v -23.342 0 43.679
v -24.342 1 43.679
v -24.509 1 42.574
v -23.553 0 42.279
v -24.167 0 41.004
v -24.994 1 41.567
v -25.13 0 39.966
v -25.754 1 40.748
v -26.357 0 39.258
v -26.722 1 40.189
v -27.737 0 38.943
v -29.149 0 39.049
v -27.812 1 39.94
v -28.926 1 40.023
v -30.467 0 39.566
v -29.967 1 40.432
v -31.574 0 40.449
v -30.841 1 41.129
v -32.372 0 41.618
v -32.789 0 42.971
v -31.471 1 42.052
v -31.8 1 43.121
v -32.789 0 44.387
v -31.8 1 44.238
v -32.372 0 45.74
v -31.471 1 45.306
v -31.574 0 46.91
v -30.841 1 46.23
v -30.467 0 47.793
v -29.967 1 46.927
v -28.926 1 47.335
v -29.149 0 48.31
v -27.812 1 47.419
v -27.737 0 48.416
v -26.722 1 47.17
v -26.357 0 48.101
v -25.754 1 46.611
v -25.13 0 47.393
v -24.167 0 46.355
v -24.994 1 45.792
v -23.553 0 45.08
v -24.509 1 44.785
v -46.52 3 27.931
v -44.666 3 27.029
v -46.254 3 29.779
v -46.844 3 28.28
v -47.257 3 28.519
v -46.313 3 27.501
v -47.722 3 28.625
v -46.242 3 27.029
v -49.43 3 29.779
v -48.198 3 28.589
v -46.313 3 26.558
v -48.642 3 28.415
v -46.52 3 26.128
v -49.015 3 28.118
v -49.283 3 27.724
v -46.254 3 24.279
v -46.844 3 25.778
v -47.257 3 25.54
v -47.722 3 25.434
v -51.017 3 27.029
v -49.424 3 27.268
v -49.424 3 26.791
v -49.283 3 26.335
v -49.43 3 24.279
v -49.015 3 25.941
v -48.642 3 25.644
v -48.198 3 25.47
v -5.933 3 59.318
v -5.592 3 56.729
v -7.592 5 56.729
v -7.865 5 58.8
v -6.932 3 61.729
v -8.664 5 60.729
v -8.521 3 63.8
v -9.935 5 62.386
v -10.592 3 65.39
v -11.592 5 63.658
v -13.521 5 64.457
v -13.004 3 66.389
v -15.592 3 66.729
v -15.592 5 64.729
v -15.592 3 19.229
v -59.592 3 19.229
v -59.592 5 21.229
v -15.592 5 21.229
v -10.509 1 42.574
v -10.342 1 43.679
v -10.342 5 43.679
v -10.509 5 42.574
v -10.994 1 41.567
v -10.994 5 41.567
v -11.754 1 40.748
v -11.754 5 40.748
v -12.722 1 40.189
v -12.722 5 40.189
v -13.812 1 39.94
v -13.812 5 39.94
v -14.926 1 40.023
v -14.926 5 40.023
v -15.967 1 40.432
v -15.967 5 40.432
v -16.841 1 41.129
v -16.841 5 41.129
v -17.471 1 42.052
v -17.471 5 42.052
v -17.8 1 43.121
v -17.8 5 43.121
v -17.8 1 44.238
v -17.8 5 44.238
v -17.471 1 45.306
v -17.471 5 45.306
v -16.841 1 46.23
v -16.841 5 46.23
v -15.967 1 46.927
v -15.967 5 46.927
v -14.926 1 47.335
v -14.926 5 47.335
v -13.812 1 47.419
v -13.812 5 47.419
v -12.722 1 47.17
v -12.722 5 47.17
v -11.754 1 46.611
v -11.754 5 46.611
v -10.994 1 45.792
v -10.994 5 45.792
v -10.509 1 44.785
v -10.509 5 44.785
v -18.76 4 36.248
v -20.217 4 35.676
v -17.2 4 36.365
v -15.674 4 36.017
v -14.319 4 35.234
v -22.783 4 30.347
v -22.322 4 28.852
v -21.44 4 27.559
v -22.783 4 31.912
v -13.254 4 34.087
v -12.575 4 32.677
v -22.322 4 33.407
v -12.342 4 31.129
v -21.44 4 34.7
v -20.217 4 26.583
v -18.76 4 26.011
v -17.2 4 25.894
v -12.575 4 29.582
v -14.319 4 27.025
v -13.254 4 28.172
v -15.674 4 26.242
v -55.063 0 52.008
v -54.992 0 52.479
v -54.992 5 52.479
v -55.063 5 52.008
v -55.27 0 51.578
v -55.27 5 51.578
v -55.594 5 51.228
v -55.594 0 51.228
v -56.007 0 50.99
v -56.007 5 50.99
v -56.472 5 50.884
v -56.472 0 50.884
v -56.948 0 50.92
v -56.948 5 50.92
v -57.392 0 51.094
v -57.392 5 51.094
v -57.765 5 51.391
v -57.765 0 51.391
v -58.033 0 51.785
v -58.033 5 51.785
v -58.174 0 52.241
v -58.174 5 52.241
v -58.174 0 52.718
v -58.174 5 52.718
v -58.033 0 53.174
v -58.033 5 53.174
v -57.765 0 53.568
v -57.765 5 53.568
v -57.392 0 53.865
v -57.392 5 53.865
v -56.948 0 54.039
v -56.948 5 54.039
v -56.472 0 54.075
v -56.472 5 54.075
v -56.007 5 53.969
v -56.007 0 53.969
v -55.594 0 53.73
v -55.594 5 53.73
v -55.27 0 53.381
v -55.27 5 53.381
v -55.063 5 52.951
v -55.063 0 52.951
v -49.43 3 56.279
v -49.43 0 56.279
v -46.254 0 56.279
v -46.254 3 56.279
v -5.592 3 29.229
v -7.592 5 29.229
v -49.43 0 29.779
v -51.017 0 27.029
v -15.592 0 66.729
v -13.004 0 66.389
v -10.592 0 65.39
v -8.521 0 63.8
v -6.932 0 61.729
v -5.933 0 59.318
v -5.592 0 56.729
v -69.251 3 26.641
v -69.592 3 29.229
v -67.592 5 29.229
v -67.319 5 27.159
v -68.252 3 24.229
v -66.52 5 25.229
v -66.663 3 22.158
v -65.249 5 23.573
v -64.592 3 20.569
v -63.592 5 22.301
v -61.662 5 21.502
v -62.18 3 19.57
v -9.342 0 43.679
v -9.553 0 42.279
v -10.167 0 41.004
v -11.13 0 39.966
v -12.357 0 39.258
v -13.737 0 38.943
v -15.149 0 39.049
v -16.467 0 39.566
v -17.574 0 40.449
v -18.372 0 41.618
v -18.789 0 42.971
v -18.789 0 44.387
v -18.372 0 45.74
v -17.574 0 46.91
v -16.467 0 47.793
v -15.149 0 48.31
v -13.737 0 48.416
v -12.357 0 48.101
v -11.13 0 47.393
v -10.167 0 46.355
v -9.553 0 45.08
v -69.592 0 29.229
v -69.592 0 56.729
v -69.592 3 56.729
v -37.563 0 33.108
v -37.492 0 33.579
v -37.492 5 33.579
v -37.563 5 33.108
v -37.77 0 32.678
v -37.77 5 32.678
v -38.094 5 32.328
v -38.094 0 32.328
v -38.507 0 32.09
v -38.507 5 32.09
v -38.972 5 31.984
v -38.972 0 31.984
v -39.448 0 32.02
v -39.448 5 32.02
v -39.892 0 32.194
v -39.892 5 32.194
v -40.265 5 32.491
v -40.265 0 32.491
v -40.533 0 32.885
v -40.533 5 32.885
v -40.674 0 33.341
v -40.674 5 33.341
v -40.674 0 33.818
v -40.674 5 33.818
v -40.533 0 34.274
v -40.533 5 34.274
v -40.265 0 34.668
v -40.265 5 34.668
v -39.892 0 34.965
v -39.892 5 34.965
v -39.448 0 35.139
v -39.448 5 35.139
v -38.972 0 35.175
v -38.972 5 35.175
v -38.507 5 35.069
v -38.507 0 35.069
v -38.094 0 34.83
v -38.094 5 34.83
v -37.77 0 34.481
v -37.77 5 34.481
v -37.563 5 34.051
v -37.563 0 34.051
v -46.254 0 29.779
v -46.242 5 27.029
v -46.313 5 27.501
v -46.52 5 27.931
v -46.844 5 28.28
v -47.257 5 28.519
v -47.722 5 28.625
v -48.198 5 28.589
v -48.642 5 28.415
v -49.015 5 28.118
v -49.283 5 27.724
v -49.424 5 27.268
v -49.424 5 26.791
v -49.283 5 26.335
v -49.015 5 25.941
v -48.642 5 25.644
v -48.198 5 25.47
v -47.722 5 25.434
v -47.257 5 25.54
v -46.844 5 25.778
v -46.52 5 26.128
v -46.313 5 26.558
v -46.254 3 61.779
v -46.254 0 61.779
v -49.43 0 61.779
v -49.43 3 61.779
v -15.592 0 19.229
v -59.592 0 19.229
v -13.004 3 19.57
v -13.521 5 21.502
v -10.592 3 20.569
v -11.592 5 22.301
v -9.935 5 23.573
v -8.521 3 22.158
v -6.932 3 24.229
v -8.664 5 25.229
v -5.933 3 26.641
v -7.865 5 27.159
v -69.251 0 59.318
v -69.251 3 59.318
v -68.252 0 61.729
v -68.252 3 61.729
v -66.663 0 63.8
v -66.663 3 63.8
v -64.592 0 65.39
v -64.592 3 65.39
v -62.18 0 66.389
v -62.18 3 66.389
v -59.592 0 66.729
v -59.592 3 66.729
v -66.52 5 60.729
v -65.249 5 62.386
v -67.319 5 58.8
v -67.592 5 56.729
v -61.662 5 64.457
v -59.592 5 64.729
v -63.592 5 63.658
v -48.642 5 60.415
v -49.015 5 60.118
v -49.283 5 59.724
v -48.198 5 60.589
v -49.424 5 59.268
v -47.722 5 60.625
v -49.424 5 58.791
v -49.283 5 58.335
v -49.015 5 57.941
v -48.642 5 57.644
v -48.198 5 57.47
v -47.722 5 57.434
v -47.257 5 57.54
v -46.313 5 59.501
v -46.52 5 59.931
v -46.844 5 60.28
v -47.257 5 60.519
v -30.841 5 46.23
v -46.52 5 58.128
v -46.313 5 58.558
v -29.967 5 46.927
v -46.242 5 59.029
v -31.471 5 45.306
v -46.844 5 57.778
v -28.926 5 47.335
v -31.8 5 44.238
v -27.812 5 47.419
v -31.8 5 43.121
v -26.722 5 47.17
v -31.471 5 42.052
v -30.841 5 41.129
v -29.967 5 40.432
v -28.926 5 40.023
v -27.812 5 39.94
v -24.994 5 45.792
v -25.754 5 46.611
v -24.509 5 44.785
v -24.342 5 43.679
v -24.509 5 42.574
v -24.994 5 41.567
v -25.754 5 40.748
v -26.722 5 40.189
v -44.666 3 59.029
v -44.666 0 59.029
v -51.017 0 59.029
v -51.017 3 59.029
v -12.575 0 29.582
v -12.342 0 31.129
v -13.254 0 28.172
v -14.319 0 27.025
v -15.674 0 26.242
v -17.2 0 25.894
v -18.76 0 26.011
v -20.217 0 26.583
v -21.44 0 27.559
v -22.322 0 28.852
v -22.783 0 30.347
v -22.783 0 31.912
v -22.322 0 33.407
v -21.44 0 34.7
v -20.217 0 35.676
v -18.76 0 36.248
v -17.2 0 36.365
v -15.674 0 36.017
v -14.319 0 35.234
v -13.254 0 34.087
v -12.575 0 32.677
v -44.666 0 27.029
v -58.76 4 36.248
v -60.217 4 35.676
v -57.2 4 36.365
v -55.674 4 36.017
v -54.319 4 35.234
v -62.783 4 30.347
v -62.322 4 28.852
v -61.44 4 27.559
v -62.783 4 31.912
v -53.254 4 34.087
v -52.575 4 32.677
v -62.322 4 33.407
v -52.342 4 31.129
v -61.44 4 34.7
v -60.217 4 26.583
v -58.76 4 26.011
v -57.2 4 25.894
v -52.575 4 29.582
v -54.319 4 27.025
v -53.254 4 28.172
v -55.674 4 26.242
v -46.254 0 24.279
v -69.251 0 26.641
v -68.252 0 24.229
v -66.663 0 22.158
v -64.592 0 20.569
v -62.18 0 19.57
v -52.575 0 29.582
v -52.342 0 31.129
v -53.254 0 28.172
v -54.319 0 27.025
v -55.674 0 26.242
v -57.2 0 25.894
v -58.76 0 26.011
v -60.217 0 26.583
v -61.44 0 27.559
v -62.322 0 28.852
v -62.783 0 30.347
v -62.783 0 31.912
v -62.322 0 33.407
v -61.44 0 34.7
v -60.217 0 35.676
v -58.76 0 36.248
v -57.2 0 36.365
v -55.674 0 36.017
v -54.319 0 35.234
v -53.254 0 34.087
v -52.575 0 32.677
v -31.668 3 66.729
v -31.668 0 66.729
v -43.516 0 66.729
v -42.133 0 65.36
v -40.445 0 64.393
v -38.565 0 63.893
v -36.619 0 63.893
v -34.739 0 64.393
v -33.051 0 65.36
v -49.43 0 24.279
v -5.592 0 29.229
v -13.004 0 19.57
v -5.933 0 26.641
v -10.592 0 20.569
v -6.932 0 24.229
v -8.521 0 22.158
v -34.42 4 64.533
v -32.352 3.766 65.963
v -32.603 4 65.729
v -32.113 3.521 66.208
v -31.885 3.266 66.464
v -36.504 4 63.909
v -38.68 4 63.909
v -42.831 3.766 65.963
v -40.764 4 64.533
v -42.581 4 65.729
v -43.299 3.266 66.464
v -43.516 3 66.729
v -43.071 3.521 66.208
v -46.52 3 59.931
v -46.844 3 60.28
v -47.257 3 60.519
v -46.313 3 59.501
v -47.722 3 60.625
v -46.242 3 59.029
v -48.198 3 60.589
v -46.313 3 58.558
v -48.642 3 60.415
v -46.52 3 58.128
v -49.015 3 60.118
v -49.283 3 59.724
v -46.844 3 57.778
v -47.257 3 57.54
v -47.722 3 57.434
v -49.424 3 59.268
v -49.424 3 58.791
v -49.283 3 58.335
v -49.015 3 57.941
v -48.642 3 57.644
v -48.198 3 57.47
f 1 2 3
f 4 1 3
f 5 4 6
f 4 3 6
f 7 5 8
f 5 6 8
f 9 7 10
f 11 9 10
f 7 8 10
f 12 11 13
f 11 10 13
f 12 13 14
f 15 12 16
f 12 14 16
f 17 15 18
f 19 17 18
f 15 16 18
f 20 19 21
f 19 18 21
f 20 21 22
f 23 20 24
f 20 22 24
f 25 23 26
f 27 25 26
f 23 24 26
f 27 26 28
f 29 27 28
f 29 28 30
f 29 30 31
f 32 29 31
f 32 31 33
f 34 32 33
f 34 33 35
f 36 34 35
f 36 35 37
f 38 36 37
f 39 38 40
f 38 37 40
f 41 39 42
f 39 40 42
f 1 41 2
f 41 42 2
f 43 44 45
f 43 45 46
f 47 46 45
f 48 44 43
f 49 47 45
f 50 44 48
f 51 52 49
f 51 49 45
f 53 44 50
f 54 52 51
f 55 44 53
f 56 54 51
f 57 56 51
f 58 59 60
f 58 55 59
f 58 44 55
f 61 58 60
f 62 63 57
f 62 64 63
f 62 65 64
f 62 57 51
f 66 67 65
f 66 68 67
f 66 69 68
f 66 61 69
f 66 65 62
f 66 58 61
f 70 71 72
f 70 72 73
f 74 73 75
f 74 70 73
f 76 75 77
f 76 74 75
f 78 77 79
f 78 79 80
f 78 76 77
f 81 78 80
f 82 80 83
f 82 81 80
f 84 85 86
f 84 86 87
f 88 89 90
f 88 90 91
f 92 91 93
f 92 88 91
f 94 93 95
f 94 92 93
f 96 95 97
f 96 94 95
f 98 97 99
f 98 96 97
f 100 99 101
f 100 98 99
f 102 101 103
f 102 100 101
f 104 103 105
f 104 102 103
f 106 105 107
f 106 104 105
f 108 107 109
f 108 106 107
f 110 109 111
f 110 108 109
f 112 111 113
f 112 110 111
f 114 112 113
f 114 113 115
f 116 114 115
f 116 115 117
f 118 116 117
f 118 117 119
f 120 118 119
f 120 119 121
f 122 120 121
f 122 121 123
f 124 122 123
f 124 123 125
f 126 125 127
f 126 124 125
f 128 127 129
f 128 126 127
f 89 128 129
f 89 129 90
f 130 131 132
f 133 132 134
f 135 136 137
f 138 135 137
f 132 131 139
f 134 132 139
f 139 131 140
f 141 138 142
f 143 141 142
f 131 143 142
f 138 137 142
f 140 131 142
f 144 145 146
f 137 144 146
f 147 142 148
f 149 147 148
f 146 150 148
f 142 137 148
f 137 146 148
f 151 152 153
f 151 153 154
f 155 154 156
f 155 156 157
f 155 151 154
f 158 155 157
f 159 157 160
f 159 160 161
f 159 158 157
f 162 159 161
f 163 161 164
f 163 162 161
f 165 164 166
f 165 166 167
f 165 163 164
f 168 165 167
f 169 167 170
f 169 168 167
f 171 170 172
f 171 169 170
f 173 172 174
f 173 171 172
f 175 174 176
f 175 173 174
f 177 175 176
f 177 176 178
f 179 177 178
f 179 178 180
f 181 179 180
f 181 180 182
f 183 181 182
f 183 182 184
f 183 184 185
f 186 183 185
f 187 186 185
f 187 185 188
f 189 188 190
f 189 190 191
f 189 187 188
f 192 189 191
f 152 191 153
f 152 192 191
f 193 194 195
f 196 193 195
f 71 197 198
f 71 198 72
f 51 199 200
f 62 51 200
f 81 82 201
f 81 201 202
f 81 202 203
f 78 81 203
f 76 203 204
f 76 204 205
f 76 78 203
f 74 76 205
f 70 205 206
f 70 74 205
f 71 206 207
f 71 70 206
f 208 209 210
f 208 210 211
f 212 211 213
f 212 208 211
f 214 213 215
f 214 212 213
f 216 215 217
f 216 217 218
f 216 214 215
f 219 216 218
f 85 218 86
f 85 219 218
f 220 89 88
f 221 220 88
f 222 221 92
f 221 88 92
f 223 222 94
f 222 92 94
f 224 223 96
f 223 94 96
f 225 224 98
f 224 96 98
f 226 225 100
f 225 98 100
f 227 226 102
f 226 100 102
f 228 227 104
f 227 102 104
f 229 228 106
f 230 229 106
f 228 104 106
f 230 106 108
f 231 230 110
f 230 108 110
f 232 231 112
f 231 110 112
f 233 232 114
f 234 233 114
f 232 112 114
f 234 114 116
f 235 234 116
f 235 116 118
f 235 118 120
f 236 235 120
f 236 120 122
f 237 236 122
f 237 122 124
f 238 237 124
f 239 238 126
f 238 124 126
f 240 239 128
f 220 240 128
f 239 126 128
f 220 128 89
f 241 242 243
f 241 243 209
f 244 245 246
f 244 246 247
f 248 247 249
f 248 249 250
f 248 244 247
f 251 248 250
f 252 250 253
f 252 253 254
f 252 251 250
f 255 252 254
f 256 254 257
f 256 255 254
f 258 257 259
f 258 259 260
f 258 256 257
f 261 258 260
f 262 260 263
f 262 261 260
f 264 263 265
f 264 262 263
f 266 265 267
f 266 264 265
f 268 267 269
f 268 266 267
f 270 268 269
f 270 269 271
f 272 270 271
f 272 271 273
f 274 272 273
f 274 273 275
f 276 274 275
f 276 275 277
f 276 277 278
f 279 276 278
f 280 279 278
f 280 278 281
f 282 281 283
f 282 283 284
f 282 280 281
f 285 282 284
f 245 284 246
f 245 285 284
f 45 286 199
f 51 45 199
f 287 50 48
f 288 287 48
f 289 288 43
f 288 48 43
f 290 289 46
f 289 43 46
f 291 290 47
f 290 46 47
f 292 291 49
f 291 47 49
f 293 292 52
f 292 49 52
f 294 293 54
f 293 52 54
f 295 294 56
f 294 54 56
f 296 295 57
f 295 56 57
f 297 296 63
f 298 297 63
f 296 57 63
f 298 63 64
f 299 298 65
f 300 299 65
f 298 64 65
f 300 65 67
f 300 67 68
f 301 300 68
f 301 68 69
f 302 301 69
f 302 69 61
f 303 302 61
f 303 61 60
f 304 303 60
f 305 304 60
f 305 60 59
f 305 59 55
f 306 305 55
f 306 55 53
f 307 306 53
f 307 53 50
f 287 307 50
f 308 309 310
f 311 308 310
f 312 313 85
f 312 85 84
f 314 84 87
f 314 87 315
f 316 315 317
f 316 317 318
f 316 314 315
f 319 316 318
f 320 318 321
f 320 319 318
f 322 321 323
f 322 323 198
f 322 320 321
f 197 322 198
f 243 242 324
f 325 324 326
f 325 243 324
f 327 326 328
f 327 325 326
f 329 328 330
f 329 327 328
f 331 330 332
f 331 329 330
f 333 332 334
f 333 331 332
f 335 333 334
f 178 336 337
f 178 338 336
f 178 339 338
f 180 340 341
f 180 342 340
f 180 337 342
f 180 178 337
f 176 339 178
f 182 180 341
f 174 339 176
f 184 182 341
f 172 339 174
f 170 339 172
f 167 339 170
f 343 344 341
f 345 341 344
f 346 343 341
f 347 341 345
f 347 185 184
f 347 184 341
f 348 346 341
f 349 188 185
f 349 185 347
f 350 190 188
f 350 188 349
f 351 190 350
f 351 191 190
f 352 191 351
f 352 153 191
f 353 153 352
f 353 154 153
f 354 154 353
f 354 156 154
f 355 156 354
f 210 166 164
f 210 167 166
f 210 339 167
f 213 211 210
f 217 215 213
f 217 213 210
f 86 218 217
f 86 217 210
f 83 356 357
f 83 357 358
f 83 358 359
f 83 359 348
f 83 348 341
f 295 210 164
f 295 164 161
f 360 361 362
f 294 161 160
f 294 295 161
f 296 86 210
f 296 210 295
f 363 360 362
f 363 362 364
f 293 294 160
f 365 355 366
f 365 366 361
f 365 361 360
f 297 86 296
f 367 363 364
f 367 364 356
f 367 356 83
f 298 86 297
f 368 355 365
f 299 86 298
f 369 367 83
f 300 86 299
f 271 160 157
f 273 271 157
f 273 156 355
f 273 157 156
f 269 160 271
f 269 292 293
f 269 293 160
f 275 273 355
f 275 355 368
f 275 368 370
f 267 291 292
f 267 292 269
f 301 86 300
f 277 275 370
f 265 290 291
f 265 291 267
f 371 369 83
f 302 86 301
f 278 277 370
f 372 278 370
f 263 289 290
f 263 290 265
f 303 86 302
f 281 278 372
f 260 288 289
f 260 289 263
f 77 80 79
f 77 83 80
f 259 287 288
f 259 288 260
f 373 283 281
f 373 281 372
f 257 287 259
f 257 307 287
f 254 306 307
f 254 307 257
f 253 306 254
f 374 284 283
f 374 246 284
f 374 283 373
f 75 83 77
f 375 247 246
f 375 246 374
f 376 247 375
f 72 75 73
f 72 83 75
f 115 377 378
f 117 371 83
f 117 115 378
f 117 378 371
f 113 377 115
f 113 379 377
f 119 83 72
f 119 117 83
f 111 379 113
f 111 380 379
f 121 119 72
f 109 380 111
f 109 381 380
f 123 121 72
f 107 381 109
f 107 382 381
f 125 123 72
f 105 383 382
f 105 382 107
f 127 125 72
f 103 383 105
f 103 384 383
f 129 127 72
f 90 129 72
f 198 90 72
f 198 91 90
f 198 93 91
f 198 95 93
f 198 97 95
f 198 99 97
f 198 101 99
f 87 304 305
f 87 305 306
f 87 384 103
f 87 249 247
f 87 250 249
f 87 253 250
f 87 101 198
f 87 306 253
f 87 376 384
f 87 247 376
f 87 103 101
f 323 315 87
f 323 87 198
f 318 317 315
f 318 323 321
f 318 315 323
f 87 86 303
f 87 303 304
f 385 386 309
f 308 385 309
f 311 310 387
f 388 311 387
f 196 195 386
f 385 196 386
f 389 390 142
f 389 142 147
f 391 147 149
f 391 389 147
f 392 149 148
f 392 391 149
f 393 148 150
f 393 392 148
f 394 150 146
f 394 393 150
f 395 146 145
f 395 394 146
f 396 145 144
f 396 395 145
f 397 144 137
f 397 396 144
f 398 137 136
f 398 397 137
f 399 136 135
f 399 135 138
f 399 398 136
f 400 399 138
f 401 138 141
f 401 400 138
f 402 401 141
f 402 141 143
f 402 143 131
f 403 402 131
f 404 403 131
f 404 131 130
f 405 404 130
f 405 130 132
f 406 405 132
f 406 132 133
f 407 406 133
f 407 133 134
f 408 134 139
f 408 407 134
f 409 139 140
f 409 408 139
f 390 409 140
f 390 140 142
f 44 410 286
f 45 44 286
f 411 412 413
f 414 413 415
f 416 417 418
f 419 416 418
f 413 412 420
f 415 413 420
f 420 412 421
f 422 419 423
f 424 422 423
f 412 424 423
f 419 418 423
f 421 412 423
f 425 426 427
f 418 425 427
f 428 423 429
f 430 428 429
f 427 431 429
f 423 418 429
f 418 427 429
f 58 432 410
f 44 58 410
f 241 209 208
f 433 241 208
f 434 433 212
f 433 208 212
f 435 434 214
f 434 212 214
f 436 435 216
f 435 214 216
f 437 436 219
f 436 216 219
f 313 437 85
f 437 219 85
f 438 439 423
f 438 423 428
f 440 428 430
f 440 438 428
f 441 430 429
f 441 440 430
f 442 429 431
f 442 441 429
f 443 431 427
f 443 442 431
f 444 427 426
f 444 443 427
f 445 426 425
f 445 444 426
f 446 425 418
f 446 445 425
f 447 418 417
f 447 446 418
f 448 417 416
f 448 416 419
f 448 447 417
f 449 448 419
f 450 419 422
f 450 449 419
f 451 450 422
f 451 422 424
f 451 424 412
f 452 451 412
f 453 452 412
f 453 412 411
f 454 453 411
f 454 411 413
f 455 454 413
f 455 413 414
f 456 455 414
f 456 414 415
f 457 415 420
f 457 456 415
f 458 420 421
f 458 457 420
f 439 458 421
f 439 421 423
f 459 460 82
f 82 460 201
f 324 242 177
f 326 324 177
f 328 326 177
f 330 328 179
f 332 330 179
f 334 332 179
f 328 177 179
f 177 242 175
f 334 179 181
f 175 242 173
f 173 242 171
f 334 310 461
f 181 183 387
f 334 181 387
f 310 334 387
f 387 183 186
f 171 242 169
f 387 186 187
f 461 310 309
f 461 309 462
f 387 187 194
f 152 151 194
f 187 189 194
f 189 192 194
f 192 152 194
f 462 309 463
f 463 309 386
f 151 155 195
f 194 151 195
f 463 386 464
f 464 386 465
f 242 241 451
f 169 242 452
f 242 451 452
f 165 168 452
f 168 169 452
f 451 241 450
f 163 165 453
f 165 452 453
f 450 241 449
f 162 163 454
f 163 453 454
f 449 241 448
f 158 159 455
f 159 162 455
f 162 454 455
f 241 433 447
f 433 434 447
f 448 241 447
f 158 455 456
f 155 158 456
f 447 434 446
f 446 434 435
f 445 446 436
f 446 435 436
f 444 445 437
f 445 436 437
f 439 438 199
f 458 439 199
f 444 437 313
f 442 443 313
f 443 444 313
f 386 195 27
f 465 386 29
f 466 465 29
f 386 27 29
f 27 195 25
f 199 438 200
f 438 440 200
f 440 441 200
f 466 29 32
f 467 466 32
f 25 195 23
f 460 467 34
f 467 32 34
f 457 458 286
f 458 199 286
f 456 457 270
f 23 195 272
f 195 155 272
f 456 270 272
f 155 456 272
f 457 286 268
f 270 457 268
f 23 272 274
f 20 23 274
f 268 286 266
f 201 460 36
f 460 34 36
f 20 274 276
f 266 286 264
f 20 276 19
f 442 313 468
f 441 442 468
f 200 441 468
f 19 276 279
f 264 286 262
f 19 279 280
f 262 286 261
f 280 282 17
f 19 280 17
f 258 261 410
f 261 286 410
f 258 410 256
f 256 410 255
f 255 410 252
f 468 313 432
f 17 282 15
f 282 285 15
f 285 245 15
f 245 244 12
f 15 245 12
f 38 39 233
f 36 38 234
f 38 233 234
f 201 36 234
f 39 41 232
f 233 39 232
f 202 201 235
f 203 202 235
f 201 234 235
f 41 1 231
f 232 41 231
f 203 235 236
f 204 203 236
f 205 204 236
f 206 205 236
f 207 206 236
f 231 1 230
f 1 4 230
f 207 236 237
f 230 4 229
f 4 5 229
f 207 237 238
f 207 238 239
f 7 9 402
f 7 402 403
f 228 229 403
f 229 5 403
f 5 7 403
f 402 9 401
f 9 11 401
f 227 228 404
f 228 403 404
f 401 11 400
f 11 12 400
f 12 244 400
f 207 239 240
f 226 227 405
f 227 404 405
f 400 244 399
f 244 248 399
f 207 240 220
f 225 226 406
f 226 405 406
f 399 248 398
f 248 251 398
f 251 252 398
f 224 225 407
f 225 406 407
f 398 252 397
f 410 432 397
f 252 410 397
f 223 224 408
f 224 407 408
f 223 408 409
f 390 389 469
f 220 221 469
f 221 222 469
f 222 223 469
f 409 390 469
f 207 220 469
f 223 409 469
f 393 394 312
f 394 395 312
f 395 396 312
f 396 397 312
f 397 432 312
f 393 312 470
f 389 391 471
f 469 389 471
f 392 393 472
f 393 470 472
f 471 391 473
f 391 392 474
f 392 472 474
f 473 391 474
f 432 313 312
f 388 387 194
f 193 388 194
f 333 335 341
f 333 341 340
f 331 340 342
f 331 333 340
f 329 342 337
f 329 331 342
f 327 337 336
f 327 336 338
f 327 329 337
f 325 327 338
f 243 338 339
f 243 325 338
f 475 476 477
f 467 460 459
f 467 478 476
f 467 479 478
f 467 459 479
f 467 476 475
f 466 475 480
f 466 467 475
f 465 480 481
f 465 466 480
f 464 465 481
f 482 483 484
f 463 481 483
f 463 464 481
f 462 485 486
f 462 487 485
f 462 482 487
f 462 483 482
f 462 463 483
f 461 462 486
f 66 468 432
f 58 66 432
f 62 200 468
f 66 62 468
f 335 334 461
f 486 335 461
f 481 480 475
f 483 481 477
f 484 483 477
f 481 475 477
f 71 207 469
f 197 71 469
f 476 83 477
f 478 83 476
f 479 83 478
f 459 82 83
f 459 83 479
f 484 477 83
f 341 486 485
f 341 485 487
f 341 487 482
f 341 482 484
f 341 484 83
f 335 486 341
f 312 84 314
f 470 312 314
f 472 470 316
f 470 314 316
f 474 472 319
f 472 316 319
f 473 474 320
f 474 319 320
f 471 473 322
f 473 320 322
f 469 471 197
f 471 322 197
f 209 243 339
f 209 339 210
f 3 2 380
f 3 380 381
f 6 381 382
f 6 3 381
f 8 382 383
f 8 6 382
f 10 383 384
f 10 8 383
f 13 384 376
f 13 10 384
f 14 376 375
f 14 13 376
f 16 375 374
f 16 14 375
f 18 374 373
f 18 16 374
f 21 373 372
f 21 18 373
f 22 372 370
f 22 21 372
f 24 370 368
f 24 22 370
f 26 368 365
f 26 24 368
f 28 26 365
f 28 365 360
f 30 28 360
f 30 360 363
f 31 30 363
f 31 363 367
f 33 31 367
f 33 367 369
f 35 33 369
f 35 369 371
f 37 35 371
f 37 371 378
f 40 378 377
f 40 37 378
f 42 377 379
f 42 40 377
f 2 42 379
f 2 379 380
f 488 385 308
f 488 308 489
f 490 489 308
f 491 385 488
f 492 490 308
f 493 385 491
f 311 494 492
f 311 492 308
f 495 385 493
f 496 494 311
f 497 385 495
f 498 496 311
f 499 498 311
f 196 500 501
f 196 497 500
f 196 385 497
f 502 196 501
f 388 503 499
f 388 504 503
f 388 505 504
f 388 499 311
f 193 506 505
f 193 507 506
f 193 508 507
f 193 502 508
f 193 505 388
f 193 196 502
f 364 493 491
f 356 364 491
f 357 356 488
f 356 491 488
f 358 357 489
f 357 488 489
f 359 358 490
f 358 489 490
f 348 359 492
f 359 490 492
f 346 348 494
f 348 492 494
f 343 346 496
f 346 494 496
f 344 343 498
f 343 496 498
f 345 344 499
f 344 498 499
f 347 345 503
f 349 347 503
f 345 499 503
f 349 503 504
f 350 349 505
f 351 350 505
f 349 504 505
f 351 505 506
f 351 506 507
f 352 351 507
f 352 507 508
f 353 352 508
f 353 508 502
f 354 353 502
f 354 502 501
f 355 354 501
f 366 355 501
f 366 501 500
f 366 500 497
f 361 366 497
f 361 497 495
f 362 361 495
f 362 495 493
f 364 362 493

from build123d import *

# Parameters (mm, degrees)
SKETCH1_W           = 64
SKETCH1_H           = 47.5
SKETCH1_R           = 1.6
SKETCH1_R_2         = 3.75
BOSS_EXTRUDE1_DEPTH = 5
SKETCH2_R           = 1.6
CUT_EXTRUDE1_DEPTH  = 6
CUT_EXTRUDE2_DEPTH  = 3
FILLET1_R           = 10
FILLET2_R           = 10
CHAMFER1_SIZE       = 2
CHAMFER2_SIZE       = 1
SKETCH4_R           = 5.25
SKETCH4_R_2         = 7.5
CUT_EXTRUDE3_DEPTH  = 4


with BuildPart() as part:
    # Sketch1 → Boss-Extrude1 (new body)
    with BuildSketch(Plane(origin=(0, 0, 0), x_dir=(1, 0, 0), z_dir=(0, 1, 0))):
        with Locations((-37.591918828, -42.97941453)):
            Rectangle(SKETCH1_W, SKETCH1_H)
        with Locations((-39.091918828, -33.57941453)):
            Circle(SKETCH1_R, mode=Mode.SUBTRACT)
        with Locations((-56.591918828, -52.47941453)):
            Circle(SKETCH1_R, mode=Mode.SUBTRACT)
        with Locations((-28.091918828, -43.67941453)):
            Circle(SKETCH1_R_2, mode=Mode.SUBTRACT)
        with Locations((-14.091918828, -43.67941453)):
            Circle(SKETCH1_R_2, mode=Mode.SUBTRACT)
    extrude(amount=BOSS_EXTRUDE1_DEPTH)

    # Sketch2 → Cut-Extrude1 (cut, through all)
    with BuildSketch(Plane.XZ):
        with Locations((-47.841918828, 59.02941453)):
            Circle(SKETCH2_R)
        with Locations((-47.841918828, 27.02941453)):
            Circle(SKETCH2_R)
    extrude(amount=-CUT_EXTRUDE1_DEPTH, mode=Mode.SUBTRACT)

    # Sketch3 → Cut-Extrude2 (cut)
    with BuildSketch(Plane(origin=(0, 0, 0), x_dir=(-1, 0, 0), z_dir=(0, -1, 0))):
        Polygon((49.429632069, -56.27941453), (46.254205588, -56.27941453), (44.666492348, -59.02941453), (46.254205588, -61.77941453), (49.429632069, -61.77941453), (51.017345309, -59.02941453), align=None)
        Polygon((46.254205588, -29.77941453), (49.429632069, -29.77941453), (51.017345309, -27.02941453), (49.429632069, -24.27941453), (46.254205588, -24.27941453), (44.666492348, -27.02941453), align=None)
    extrude(amount=-CUT_EXTRUDE2_DEPTH, mode=Mode.SUBTRACT)

    # Fillet1
    fillet1_edges = [part.edges().sort_by_distance(p)[0] for p in [
        (-69.591918828, 2.5, 19.22941453),
        (-5.591918828, 2.5, 19.22941453),
    ]]
    fillet(fillet1_edges, radius=FILLET1_R)

    # Fillet2
    fillet2_edges = [part.edges().sort_by_distance(p)[0] for p in [
        (-5.591918828, 2.5, 66.72941453),
        (-69.591918828, 2.5, 66.72941453),
    ]]
    fillet(fillet2_edges, radius=FILLET2_R)

    # Chamfer1
    chamfer1_edges = [part.edges().sort_by_distance(p)[0] for p in [
        (-37.591918828, 5, 19.22941453),
        (-69.591918828, 5, 42.97941453),
        (-66.66298664, 5, 22.158346718),
        (-8.520851016, 5, 22.158346718),
        (-5.591918828, 5, 42.97941453),
        (-37.591918828, 5, 66.72941453),
        (-66.66298664, 5, 63.800482342),
        (-8.520851016, 5, 63.800482342),
    ]]
    chamfer(chamfer1_edges, length=CHAMFER1_SIZE)

    # Chamfer2
    chamfer2_edges = [part.edges().sort_by_distance(p)[0] for p in [
        (-17.841918828, 0, 43.67941453),
        (-31.841918828, 0, 43.67941453),
    ]]
    chamfer(chamfer2_edges, length=CHAMFER2_SIZE)

    # Sketch4 → Cut-Extrude3 (cut)
    with BuildSketch(Plane(origin=(0, 0, 0), x_dir=(1, 0, 0), z_dir=(0, 1, 0))):
        with Locations((-57.591918828, -31.12941453)):
            Circle(SKETCH4_R)
        with Locations((-17.591918828, -31.12941453)):
            Circle(SKETCH4_R)
        with Locations((-37.591918828, -71.32941453)):
            Circle(SKETCH4_R_2)
    extrude(amount=CUT_EXTRUDE3_DEPTH, mode=Mode.SUBTRACT)


solid = part.part
